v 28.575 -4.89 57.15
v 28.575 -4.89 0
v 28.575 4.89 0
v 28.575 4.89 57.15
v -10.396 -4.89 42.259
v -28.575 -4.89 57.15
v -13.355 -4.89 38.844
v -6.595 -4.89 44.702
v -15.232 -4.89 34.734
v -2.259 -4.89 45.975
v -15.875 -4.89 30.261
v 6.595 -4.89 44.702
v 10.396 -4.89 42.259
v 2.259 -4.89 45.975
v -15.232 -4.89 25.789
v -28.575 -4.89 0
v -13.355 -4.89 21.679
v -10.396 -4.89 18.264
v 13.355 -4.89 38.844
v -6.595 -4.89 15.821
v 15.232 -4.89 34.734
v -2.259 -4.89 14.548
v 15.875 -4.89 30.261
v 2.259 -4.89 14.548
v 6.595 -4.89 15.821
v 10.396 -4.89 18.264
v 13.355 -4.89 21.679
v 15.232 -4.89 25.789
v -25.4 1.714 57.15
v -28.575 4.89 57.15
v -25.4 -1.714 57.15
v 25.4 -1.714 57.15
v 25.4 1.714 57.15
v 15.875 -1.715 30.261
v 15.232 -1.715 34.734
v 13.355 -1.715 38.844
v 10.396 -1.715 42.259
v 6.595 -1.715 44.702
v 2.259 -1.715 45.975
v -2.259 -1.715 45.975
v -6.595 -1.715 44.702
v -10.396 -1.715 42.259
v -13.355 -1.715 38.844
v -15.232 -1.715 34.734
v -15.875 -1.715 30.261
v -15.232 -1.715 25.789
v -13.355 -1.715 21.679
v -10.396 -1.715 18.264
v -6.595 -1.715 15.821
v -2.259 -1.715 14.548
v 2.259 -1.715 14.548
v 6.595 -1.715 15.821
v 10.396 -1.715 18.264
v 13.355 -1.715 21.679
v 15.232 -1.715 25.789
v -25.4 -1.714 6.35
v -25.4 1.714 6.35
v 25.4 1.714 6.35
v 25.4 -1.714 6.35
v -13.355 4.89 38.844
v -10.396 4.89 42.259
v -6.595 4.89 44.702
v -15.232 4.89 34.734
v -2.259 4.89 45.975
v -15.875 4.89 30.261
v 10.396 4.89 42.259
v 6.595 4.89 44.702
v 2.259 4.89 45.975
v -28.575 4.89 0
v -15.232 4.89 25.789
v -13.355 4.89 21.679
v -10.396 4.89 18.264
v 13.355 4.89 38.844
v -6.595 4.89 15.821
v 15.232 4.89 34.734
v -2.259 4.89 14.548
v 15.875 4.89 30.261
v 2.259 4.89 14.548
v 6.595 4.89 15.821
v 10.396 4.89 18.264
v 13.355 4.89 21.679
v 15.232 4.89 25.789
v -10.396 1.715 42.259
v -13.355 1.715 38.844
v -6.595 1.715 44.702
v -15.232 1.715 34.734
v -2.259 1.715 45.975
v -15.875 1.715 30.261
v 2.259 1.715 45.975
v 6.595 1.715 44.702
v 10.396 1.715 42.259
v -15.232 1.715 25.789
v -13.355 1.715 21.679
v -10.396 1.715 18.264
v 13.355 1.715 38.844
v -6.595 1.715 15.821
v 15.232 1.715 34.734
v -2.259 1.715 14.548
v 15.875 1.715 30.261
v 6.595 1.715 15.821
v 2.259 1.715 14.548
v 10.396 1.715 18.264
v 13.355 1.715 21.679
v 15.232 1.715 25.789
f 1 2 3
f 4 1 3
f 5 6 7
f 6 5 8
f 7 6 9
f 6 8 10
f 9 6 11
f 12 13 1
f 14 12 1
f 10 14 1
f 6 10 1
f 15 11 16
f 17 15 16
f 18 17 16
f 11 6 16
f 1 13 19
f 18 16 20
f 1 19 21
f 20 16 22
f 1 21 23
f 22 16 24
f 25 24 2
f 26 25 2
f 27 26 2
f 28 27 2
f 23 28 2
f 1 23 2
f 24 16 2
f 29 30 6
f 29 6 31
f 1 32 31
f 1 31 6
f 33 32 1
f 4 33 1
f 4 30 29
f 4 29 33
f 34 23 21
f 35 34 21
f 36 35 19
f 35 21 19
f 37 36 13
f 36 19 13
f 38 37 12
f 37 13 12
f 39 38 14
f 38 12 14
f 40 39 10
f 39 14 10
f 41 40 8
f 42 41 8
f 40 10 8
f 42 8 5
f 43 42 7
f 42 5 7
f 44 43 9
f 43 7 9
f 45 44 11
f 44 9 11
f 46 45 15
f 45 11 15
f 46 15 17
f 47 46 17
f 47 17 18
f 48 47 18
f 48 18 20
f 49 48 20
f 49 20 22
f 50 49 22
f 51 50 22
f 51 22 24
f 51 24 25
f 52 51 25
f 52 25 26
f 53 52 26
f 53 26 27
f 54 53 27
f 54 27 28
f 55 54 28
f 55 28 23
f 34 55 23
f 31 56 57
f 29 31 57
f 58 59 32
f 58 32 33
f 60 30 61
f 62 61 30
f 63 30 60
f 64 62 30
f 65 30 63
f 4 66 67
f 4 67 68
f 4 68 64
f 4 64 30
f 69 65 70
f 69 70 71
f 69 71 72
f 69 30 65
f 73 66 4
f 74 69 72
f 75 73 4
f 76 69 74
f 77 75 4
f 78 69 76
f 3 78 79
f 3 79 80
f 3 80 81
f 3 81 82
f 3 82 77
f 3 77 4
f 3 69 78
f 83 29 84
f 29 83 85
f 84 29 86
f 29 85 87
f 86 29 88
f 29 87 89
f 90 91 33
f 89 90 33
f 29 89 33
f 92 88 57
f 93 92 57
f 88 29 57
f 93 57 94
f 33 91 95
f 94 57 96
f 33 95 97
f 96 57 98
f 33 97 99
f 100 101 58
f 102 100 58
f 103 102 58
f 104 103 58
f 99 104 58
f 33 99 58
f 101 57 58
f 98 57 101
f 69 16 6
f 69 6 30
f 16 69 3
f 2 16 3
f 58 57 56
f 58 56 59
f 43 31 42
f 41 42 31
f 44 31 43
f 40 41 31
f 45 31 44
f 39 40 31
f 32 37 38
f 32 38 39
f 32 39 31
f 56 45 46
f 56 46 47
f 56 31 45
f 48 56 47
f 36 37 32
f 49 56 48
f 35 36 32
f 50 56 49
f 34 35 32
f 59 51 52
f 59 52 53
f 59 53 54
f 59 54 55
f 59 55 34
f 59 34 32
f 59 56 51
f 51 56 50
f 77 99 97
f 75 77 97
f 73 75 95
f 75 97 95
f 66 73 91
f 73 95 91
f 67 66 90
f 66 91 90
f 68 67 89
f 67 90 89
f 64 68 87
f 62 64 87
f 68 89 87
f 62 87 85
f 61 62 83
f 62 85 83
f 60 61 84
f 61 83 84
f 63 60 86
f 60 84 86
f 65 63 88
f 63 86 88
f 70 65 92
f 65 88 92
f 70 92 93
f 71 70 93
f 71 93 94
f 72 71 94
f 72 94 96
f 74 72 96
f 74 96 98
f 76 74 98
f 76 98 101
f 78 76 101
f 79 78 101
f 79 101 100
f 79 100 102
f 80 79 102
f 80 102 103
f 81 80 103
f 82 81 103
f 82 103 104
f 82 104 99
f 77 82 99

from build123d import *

# Parameters (mm, degrees)
F0_W     = 57.15
F0_H     = 9.779
F0_W_2   = 50.8
F0_H_2   = 3.429
F1_DEPTH = 57.15
F2_DEPTH = 6.35
F3_R     = 15.875
F4_DEPTH = 9.78


with BuildPart() as f1:
    # F0 (on Top) → F1 (new body)
    with BuildSketch(Plane.XY):
        Rectangle(F0_W, F0_H)
        Rectangle(F0_W_2, F0_H_2, mode=Mode.SUBTRACT)
    extrude(amount=F1_DEPTH)

    # F0 (on Top) → F2 (join)
    with BuildSketch(Plane.XY):
        Rectangle(F0_W_2, F0_H_2)
    extrude(amount=F2_DEPTH)

    # F3 (on face) → F4 (cut, through all)
    with BuildSketch(Plane.XZ.offset(4.8895)):
        with Locations((0, 30.261343)):
            Circle(F3_R)
    extrude(amount=-F4_DEPTH, mode=Mode.SUBTRACT)


solid = f1.part
